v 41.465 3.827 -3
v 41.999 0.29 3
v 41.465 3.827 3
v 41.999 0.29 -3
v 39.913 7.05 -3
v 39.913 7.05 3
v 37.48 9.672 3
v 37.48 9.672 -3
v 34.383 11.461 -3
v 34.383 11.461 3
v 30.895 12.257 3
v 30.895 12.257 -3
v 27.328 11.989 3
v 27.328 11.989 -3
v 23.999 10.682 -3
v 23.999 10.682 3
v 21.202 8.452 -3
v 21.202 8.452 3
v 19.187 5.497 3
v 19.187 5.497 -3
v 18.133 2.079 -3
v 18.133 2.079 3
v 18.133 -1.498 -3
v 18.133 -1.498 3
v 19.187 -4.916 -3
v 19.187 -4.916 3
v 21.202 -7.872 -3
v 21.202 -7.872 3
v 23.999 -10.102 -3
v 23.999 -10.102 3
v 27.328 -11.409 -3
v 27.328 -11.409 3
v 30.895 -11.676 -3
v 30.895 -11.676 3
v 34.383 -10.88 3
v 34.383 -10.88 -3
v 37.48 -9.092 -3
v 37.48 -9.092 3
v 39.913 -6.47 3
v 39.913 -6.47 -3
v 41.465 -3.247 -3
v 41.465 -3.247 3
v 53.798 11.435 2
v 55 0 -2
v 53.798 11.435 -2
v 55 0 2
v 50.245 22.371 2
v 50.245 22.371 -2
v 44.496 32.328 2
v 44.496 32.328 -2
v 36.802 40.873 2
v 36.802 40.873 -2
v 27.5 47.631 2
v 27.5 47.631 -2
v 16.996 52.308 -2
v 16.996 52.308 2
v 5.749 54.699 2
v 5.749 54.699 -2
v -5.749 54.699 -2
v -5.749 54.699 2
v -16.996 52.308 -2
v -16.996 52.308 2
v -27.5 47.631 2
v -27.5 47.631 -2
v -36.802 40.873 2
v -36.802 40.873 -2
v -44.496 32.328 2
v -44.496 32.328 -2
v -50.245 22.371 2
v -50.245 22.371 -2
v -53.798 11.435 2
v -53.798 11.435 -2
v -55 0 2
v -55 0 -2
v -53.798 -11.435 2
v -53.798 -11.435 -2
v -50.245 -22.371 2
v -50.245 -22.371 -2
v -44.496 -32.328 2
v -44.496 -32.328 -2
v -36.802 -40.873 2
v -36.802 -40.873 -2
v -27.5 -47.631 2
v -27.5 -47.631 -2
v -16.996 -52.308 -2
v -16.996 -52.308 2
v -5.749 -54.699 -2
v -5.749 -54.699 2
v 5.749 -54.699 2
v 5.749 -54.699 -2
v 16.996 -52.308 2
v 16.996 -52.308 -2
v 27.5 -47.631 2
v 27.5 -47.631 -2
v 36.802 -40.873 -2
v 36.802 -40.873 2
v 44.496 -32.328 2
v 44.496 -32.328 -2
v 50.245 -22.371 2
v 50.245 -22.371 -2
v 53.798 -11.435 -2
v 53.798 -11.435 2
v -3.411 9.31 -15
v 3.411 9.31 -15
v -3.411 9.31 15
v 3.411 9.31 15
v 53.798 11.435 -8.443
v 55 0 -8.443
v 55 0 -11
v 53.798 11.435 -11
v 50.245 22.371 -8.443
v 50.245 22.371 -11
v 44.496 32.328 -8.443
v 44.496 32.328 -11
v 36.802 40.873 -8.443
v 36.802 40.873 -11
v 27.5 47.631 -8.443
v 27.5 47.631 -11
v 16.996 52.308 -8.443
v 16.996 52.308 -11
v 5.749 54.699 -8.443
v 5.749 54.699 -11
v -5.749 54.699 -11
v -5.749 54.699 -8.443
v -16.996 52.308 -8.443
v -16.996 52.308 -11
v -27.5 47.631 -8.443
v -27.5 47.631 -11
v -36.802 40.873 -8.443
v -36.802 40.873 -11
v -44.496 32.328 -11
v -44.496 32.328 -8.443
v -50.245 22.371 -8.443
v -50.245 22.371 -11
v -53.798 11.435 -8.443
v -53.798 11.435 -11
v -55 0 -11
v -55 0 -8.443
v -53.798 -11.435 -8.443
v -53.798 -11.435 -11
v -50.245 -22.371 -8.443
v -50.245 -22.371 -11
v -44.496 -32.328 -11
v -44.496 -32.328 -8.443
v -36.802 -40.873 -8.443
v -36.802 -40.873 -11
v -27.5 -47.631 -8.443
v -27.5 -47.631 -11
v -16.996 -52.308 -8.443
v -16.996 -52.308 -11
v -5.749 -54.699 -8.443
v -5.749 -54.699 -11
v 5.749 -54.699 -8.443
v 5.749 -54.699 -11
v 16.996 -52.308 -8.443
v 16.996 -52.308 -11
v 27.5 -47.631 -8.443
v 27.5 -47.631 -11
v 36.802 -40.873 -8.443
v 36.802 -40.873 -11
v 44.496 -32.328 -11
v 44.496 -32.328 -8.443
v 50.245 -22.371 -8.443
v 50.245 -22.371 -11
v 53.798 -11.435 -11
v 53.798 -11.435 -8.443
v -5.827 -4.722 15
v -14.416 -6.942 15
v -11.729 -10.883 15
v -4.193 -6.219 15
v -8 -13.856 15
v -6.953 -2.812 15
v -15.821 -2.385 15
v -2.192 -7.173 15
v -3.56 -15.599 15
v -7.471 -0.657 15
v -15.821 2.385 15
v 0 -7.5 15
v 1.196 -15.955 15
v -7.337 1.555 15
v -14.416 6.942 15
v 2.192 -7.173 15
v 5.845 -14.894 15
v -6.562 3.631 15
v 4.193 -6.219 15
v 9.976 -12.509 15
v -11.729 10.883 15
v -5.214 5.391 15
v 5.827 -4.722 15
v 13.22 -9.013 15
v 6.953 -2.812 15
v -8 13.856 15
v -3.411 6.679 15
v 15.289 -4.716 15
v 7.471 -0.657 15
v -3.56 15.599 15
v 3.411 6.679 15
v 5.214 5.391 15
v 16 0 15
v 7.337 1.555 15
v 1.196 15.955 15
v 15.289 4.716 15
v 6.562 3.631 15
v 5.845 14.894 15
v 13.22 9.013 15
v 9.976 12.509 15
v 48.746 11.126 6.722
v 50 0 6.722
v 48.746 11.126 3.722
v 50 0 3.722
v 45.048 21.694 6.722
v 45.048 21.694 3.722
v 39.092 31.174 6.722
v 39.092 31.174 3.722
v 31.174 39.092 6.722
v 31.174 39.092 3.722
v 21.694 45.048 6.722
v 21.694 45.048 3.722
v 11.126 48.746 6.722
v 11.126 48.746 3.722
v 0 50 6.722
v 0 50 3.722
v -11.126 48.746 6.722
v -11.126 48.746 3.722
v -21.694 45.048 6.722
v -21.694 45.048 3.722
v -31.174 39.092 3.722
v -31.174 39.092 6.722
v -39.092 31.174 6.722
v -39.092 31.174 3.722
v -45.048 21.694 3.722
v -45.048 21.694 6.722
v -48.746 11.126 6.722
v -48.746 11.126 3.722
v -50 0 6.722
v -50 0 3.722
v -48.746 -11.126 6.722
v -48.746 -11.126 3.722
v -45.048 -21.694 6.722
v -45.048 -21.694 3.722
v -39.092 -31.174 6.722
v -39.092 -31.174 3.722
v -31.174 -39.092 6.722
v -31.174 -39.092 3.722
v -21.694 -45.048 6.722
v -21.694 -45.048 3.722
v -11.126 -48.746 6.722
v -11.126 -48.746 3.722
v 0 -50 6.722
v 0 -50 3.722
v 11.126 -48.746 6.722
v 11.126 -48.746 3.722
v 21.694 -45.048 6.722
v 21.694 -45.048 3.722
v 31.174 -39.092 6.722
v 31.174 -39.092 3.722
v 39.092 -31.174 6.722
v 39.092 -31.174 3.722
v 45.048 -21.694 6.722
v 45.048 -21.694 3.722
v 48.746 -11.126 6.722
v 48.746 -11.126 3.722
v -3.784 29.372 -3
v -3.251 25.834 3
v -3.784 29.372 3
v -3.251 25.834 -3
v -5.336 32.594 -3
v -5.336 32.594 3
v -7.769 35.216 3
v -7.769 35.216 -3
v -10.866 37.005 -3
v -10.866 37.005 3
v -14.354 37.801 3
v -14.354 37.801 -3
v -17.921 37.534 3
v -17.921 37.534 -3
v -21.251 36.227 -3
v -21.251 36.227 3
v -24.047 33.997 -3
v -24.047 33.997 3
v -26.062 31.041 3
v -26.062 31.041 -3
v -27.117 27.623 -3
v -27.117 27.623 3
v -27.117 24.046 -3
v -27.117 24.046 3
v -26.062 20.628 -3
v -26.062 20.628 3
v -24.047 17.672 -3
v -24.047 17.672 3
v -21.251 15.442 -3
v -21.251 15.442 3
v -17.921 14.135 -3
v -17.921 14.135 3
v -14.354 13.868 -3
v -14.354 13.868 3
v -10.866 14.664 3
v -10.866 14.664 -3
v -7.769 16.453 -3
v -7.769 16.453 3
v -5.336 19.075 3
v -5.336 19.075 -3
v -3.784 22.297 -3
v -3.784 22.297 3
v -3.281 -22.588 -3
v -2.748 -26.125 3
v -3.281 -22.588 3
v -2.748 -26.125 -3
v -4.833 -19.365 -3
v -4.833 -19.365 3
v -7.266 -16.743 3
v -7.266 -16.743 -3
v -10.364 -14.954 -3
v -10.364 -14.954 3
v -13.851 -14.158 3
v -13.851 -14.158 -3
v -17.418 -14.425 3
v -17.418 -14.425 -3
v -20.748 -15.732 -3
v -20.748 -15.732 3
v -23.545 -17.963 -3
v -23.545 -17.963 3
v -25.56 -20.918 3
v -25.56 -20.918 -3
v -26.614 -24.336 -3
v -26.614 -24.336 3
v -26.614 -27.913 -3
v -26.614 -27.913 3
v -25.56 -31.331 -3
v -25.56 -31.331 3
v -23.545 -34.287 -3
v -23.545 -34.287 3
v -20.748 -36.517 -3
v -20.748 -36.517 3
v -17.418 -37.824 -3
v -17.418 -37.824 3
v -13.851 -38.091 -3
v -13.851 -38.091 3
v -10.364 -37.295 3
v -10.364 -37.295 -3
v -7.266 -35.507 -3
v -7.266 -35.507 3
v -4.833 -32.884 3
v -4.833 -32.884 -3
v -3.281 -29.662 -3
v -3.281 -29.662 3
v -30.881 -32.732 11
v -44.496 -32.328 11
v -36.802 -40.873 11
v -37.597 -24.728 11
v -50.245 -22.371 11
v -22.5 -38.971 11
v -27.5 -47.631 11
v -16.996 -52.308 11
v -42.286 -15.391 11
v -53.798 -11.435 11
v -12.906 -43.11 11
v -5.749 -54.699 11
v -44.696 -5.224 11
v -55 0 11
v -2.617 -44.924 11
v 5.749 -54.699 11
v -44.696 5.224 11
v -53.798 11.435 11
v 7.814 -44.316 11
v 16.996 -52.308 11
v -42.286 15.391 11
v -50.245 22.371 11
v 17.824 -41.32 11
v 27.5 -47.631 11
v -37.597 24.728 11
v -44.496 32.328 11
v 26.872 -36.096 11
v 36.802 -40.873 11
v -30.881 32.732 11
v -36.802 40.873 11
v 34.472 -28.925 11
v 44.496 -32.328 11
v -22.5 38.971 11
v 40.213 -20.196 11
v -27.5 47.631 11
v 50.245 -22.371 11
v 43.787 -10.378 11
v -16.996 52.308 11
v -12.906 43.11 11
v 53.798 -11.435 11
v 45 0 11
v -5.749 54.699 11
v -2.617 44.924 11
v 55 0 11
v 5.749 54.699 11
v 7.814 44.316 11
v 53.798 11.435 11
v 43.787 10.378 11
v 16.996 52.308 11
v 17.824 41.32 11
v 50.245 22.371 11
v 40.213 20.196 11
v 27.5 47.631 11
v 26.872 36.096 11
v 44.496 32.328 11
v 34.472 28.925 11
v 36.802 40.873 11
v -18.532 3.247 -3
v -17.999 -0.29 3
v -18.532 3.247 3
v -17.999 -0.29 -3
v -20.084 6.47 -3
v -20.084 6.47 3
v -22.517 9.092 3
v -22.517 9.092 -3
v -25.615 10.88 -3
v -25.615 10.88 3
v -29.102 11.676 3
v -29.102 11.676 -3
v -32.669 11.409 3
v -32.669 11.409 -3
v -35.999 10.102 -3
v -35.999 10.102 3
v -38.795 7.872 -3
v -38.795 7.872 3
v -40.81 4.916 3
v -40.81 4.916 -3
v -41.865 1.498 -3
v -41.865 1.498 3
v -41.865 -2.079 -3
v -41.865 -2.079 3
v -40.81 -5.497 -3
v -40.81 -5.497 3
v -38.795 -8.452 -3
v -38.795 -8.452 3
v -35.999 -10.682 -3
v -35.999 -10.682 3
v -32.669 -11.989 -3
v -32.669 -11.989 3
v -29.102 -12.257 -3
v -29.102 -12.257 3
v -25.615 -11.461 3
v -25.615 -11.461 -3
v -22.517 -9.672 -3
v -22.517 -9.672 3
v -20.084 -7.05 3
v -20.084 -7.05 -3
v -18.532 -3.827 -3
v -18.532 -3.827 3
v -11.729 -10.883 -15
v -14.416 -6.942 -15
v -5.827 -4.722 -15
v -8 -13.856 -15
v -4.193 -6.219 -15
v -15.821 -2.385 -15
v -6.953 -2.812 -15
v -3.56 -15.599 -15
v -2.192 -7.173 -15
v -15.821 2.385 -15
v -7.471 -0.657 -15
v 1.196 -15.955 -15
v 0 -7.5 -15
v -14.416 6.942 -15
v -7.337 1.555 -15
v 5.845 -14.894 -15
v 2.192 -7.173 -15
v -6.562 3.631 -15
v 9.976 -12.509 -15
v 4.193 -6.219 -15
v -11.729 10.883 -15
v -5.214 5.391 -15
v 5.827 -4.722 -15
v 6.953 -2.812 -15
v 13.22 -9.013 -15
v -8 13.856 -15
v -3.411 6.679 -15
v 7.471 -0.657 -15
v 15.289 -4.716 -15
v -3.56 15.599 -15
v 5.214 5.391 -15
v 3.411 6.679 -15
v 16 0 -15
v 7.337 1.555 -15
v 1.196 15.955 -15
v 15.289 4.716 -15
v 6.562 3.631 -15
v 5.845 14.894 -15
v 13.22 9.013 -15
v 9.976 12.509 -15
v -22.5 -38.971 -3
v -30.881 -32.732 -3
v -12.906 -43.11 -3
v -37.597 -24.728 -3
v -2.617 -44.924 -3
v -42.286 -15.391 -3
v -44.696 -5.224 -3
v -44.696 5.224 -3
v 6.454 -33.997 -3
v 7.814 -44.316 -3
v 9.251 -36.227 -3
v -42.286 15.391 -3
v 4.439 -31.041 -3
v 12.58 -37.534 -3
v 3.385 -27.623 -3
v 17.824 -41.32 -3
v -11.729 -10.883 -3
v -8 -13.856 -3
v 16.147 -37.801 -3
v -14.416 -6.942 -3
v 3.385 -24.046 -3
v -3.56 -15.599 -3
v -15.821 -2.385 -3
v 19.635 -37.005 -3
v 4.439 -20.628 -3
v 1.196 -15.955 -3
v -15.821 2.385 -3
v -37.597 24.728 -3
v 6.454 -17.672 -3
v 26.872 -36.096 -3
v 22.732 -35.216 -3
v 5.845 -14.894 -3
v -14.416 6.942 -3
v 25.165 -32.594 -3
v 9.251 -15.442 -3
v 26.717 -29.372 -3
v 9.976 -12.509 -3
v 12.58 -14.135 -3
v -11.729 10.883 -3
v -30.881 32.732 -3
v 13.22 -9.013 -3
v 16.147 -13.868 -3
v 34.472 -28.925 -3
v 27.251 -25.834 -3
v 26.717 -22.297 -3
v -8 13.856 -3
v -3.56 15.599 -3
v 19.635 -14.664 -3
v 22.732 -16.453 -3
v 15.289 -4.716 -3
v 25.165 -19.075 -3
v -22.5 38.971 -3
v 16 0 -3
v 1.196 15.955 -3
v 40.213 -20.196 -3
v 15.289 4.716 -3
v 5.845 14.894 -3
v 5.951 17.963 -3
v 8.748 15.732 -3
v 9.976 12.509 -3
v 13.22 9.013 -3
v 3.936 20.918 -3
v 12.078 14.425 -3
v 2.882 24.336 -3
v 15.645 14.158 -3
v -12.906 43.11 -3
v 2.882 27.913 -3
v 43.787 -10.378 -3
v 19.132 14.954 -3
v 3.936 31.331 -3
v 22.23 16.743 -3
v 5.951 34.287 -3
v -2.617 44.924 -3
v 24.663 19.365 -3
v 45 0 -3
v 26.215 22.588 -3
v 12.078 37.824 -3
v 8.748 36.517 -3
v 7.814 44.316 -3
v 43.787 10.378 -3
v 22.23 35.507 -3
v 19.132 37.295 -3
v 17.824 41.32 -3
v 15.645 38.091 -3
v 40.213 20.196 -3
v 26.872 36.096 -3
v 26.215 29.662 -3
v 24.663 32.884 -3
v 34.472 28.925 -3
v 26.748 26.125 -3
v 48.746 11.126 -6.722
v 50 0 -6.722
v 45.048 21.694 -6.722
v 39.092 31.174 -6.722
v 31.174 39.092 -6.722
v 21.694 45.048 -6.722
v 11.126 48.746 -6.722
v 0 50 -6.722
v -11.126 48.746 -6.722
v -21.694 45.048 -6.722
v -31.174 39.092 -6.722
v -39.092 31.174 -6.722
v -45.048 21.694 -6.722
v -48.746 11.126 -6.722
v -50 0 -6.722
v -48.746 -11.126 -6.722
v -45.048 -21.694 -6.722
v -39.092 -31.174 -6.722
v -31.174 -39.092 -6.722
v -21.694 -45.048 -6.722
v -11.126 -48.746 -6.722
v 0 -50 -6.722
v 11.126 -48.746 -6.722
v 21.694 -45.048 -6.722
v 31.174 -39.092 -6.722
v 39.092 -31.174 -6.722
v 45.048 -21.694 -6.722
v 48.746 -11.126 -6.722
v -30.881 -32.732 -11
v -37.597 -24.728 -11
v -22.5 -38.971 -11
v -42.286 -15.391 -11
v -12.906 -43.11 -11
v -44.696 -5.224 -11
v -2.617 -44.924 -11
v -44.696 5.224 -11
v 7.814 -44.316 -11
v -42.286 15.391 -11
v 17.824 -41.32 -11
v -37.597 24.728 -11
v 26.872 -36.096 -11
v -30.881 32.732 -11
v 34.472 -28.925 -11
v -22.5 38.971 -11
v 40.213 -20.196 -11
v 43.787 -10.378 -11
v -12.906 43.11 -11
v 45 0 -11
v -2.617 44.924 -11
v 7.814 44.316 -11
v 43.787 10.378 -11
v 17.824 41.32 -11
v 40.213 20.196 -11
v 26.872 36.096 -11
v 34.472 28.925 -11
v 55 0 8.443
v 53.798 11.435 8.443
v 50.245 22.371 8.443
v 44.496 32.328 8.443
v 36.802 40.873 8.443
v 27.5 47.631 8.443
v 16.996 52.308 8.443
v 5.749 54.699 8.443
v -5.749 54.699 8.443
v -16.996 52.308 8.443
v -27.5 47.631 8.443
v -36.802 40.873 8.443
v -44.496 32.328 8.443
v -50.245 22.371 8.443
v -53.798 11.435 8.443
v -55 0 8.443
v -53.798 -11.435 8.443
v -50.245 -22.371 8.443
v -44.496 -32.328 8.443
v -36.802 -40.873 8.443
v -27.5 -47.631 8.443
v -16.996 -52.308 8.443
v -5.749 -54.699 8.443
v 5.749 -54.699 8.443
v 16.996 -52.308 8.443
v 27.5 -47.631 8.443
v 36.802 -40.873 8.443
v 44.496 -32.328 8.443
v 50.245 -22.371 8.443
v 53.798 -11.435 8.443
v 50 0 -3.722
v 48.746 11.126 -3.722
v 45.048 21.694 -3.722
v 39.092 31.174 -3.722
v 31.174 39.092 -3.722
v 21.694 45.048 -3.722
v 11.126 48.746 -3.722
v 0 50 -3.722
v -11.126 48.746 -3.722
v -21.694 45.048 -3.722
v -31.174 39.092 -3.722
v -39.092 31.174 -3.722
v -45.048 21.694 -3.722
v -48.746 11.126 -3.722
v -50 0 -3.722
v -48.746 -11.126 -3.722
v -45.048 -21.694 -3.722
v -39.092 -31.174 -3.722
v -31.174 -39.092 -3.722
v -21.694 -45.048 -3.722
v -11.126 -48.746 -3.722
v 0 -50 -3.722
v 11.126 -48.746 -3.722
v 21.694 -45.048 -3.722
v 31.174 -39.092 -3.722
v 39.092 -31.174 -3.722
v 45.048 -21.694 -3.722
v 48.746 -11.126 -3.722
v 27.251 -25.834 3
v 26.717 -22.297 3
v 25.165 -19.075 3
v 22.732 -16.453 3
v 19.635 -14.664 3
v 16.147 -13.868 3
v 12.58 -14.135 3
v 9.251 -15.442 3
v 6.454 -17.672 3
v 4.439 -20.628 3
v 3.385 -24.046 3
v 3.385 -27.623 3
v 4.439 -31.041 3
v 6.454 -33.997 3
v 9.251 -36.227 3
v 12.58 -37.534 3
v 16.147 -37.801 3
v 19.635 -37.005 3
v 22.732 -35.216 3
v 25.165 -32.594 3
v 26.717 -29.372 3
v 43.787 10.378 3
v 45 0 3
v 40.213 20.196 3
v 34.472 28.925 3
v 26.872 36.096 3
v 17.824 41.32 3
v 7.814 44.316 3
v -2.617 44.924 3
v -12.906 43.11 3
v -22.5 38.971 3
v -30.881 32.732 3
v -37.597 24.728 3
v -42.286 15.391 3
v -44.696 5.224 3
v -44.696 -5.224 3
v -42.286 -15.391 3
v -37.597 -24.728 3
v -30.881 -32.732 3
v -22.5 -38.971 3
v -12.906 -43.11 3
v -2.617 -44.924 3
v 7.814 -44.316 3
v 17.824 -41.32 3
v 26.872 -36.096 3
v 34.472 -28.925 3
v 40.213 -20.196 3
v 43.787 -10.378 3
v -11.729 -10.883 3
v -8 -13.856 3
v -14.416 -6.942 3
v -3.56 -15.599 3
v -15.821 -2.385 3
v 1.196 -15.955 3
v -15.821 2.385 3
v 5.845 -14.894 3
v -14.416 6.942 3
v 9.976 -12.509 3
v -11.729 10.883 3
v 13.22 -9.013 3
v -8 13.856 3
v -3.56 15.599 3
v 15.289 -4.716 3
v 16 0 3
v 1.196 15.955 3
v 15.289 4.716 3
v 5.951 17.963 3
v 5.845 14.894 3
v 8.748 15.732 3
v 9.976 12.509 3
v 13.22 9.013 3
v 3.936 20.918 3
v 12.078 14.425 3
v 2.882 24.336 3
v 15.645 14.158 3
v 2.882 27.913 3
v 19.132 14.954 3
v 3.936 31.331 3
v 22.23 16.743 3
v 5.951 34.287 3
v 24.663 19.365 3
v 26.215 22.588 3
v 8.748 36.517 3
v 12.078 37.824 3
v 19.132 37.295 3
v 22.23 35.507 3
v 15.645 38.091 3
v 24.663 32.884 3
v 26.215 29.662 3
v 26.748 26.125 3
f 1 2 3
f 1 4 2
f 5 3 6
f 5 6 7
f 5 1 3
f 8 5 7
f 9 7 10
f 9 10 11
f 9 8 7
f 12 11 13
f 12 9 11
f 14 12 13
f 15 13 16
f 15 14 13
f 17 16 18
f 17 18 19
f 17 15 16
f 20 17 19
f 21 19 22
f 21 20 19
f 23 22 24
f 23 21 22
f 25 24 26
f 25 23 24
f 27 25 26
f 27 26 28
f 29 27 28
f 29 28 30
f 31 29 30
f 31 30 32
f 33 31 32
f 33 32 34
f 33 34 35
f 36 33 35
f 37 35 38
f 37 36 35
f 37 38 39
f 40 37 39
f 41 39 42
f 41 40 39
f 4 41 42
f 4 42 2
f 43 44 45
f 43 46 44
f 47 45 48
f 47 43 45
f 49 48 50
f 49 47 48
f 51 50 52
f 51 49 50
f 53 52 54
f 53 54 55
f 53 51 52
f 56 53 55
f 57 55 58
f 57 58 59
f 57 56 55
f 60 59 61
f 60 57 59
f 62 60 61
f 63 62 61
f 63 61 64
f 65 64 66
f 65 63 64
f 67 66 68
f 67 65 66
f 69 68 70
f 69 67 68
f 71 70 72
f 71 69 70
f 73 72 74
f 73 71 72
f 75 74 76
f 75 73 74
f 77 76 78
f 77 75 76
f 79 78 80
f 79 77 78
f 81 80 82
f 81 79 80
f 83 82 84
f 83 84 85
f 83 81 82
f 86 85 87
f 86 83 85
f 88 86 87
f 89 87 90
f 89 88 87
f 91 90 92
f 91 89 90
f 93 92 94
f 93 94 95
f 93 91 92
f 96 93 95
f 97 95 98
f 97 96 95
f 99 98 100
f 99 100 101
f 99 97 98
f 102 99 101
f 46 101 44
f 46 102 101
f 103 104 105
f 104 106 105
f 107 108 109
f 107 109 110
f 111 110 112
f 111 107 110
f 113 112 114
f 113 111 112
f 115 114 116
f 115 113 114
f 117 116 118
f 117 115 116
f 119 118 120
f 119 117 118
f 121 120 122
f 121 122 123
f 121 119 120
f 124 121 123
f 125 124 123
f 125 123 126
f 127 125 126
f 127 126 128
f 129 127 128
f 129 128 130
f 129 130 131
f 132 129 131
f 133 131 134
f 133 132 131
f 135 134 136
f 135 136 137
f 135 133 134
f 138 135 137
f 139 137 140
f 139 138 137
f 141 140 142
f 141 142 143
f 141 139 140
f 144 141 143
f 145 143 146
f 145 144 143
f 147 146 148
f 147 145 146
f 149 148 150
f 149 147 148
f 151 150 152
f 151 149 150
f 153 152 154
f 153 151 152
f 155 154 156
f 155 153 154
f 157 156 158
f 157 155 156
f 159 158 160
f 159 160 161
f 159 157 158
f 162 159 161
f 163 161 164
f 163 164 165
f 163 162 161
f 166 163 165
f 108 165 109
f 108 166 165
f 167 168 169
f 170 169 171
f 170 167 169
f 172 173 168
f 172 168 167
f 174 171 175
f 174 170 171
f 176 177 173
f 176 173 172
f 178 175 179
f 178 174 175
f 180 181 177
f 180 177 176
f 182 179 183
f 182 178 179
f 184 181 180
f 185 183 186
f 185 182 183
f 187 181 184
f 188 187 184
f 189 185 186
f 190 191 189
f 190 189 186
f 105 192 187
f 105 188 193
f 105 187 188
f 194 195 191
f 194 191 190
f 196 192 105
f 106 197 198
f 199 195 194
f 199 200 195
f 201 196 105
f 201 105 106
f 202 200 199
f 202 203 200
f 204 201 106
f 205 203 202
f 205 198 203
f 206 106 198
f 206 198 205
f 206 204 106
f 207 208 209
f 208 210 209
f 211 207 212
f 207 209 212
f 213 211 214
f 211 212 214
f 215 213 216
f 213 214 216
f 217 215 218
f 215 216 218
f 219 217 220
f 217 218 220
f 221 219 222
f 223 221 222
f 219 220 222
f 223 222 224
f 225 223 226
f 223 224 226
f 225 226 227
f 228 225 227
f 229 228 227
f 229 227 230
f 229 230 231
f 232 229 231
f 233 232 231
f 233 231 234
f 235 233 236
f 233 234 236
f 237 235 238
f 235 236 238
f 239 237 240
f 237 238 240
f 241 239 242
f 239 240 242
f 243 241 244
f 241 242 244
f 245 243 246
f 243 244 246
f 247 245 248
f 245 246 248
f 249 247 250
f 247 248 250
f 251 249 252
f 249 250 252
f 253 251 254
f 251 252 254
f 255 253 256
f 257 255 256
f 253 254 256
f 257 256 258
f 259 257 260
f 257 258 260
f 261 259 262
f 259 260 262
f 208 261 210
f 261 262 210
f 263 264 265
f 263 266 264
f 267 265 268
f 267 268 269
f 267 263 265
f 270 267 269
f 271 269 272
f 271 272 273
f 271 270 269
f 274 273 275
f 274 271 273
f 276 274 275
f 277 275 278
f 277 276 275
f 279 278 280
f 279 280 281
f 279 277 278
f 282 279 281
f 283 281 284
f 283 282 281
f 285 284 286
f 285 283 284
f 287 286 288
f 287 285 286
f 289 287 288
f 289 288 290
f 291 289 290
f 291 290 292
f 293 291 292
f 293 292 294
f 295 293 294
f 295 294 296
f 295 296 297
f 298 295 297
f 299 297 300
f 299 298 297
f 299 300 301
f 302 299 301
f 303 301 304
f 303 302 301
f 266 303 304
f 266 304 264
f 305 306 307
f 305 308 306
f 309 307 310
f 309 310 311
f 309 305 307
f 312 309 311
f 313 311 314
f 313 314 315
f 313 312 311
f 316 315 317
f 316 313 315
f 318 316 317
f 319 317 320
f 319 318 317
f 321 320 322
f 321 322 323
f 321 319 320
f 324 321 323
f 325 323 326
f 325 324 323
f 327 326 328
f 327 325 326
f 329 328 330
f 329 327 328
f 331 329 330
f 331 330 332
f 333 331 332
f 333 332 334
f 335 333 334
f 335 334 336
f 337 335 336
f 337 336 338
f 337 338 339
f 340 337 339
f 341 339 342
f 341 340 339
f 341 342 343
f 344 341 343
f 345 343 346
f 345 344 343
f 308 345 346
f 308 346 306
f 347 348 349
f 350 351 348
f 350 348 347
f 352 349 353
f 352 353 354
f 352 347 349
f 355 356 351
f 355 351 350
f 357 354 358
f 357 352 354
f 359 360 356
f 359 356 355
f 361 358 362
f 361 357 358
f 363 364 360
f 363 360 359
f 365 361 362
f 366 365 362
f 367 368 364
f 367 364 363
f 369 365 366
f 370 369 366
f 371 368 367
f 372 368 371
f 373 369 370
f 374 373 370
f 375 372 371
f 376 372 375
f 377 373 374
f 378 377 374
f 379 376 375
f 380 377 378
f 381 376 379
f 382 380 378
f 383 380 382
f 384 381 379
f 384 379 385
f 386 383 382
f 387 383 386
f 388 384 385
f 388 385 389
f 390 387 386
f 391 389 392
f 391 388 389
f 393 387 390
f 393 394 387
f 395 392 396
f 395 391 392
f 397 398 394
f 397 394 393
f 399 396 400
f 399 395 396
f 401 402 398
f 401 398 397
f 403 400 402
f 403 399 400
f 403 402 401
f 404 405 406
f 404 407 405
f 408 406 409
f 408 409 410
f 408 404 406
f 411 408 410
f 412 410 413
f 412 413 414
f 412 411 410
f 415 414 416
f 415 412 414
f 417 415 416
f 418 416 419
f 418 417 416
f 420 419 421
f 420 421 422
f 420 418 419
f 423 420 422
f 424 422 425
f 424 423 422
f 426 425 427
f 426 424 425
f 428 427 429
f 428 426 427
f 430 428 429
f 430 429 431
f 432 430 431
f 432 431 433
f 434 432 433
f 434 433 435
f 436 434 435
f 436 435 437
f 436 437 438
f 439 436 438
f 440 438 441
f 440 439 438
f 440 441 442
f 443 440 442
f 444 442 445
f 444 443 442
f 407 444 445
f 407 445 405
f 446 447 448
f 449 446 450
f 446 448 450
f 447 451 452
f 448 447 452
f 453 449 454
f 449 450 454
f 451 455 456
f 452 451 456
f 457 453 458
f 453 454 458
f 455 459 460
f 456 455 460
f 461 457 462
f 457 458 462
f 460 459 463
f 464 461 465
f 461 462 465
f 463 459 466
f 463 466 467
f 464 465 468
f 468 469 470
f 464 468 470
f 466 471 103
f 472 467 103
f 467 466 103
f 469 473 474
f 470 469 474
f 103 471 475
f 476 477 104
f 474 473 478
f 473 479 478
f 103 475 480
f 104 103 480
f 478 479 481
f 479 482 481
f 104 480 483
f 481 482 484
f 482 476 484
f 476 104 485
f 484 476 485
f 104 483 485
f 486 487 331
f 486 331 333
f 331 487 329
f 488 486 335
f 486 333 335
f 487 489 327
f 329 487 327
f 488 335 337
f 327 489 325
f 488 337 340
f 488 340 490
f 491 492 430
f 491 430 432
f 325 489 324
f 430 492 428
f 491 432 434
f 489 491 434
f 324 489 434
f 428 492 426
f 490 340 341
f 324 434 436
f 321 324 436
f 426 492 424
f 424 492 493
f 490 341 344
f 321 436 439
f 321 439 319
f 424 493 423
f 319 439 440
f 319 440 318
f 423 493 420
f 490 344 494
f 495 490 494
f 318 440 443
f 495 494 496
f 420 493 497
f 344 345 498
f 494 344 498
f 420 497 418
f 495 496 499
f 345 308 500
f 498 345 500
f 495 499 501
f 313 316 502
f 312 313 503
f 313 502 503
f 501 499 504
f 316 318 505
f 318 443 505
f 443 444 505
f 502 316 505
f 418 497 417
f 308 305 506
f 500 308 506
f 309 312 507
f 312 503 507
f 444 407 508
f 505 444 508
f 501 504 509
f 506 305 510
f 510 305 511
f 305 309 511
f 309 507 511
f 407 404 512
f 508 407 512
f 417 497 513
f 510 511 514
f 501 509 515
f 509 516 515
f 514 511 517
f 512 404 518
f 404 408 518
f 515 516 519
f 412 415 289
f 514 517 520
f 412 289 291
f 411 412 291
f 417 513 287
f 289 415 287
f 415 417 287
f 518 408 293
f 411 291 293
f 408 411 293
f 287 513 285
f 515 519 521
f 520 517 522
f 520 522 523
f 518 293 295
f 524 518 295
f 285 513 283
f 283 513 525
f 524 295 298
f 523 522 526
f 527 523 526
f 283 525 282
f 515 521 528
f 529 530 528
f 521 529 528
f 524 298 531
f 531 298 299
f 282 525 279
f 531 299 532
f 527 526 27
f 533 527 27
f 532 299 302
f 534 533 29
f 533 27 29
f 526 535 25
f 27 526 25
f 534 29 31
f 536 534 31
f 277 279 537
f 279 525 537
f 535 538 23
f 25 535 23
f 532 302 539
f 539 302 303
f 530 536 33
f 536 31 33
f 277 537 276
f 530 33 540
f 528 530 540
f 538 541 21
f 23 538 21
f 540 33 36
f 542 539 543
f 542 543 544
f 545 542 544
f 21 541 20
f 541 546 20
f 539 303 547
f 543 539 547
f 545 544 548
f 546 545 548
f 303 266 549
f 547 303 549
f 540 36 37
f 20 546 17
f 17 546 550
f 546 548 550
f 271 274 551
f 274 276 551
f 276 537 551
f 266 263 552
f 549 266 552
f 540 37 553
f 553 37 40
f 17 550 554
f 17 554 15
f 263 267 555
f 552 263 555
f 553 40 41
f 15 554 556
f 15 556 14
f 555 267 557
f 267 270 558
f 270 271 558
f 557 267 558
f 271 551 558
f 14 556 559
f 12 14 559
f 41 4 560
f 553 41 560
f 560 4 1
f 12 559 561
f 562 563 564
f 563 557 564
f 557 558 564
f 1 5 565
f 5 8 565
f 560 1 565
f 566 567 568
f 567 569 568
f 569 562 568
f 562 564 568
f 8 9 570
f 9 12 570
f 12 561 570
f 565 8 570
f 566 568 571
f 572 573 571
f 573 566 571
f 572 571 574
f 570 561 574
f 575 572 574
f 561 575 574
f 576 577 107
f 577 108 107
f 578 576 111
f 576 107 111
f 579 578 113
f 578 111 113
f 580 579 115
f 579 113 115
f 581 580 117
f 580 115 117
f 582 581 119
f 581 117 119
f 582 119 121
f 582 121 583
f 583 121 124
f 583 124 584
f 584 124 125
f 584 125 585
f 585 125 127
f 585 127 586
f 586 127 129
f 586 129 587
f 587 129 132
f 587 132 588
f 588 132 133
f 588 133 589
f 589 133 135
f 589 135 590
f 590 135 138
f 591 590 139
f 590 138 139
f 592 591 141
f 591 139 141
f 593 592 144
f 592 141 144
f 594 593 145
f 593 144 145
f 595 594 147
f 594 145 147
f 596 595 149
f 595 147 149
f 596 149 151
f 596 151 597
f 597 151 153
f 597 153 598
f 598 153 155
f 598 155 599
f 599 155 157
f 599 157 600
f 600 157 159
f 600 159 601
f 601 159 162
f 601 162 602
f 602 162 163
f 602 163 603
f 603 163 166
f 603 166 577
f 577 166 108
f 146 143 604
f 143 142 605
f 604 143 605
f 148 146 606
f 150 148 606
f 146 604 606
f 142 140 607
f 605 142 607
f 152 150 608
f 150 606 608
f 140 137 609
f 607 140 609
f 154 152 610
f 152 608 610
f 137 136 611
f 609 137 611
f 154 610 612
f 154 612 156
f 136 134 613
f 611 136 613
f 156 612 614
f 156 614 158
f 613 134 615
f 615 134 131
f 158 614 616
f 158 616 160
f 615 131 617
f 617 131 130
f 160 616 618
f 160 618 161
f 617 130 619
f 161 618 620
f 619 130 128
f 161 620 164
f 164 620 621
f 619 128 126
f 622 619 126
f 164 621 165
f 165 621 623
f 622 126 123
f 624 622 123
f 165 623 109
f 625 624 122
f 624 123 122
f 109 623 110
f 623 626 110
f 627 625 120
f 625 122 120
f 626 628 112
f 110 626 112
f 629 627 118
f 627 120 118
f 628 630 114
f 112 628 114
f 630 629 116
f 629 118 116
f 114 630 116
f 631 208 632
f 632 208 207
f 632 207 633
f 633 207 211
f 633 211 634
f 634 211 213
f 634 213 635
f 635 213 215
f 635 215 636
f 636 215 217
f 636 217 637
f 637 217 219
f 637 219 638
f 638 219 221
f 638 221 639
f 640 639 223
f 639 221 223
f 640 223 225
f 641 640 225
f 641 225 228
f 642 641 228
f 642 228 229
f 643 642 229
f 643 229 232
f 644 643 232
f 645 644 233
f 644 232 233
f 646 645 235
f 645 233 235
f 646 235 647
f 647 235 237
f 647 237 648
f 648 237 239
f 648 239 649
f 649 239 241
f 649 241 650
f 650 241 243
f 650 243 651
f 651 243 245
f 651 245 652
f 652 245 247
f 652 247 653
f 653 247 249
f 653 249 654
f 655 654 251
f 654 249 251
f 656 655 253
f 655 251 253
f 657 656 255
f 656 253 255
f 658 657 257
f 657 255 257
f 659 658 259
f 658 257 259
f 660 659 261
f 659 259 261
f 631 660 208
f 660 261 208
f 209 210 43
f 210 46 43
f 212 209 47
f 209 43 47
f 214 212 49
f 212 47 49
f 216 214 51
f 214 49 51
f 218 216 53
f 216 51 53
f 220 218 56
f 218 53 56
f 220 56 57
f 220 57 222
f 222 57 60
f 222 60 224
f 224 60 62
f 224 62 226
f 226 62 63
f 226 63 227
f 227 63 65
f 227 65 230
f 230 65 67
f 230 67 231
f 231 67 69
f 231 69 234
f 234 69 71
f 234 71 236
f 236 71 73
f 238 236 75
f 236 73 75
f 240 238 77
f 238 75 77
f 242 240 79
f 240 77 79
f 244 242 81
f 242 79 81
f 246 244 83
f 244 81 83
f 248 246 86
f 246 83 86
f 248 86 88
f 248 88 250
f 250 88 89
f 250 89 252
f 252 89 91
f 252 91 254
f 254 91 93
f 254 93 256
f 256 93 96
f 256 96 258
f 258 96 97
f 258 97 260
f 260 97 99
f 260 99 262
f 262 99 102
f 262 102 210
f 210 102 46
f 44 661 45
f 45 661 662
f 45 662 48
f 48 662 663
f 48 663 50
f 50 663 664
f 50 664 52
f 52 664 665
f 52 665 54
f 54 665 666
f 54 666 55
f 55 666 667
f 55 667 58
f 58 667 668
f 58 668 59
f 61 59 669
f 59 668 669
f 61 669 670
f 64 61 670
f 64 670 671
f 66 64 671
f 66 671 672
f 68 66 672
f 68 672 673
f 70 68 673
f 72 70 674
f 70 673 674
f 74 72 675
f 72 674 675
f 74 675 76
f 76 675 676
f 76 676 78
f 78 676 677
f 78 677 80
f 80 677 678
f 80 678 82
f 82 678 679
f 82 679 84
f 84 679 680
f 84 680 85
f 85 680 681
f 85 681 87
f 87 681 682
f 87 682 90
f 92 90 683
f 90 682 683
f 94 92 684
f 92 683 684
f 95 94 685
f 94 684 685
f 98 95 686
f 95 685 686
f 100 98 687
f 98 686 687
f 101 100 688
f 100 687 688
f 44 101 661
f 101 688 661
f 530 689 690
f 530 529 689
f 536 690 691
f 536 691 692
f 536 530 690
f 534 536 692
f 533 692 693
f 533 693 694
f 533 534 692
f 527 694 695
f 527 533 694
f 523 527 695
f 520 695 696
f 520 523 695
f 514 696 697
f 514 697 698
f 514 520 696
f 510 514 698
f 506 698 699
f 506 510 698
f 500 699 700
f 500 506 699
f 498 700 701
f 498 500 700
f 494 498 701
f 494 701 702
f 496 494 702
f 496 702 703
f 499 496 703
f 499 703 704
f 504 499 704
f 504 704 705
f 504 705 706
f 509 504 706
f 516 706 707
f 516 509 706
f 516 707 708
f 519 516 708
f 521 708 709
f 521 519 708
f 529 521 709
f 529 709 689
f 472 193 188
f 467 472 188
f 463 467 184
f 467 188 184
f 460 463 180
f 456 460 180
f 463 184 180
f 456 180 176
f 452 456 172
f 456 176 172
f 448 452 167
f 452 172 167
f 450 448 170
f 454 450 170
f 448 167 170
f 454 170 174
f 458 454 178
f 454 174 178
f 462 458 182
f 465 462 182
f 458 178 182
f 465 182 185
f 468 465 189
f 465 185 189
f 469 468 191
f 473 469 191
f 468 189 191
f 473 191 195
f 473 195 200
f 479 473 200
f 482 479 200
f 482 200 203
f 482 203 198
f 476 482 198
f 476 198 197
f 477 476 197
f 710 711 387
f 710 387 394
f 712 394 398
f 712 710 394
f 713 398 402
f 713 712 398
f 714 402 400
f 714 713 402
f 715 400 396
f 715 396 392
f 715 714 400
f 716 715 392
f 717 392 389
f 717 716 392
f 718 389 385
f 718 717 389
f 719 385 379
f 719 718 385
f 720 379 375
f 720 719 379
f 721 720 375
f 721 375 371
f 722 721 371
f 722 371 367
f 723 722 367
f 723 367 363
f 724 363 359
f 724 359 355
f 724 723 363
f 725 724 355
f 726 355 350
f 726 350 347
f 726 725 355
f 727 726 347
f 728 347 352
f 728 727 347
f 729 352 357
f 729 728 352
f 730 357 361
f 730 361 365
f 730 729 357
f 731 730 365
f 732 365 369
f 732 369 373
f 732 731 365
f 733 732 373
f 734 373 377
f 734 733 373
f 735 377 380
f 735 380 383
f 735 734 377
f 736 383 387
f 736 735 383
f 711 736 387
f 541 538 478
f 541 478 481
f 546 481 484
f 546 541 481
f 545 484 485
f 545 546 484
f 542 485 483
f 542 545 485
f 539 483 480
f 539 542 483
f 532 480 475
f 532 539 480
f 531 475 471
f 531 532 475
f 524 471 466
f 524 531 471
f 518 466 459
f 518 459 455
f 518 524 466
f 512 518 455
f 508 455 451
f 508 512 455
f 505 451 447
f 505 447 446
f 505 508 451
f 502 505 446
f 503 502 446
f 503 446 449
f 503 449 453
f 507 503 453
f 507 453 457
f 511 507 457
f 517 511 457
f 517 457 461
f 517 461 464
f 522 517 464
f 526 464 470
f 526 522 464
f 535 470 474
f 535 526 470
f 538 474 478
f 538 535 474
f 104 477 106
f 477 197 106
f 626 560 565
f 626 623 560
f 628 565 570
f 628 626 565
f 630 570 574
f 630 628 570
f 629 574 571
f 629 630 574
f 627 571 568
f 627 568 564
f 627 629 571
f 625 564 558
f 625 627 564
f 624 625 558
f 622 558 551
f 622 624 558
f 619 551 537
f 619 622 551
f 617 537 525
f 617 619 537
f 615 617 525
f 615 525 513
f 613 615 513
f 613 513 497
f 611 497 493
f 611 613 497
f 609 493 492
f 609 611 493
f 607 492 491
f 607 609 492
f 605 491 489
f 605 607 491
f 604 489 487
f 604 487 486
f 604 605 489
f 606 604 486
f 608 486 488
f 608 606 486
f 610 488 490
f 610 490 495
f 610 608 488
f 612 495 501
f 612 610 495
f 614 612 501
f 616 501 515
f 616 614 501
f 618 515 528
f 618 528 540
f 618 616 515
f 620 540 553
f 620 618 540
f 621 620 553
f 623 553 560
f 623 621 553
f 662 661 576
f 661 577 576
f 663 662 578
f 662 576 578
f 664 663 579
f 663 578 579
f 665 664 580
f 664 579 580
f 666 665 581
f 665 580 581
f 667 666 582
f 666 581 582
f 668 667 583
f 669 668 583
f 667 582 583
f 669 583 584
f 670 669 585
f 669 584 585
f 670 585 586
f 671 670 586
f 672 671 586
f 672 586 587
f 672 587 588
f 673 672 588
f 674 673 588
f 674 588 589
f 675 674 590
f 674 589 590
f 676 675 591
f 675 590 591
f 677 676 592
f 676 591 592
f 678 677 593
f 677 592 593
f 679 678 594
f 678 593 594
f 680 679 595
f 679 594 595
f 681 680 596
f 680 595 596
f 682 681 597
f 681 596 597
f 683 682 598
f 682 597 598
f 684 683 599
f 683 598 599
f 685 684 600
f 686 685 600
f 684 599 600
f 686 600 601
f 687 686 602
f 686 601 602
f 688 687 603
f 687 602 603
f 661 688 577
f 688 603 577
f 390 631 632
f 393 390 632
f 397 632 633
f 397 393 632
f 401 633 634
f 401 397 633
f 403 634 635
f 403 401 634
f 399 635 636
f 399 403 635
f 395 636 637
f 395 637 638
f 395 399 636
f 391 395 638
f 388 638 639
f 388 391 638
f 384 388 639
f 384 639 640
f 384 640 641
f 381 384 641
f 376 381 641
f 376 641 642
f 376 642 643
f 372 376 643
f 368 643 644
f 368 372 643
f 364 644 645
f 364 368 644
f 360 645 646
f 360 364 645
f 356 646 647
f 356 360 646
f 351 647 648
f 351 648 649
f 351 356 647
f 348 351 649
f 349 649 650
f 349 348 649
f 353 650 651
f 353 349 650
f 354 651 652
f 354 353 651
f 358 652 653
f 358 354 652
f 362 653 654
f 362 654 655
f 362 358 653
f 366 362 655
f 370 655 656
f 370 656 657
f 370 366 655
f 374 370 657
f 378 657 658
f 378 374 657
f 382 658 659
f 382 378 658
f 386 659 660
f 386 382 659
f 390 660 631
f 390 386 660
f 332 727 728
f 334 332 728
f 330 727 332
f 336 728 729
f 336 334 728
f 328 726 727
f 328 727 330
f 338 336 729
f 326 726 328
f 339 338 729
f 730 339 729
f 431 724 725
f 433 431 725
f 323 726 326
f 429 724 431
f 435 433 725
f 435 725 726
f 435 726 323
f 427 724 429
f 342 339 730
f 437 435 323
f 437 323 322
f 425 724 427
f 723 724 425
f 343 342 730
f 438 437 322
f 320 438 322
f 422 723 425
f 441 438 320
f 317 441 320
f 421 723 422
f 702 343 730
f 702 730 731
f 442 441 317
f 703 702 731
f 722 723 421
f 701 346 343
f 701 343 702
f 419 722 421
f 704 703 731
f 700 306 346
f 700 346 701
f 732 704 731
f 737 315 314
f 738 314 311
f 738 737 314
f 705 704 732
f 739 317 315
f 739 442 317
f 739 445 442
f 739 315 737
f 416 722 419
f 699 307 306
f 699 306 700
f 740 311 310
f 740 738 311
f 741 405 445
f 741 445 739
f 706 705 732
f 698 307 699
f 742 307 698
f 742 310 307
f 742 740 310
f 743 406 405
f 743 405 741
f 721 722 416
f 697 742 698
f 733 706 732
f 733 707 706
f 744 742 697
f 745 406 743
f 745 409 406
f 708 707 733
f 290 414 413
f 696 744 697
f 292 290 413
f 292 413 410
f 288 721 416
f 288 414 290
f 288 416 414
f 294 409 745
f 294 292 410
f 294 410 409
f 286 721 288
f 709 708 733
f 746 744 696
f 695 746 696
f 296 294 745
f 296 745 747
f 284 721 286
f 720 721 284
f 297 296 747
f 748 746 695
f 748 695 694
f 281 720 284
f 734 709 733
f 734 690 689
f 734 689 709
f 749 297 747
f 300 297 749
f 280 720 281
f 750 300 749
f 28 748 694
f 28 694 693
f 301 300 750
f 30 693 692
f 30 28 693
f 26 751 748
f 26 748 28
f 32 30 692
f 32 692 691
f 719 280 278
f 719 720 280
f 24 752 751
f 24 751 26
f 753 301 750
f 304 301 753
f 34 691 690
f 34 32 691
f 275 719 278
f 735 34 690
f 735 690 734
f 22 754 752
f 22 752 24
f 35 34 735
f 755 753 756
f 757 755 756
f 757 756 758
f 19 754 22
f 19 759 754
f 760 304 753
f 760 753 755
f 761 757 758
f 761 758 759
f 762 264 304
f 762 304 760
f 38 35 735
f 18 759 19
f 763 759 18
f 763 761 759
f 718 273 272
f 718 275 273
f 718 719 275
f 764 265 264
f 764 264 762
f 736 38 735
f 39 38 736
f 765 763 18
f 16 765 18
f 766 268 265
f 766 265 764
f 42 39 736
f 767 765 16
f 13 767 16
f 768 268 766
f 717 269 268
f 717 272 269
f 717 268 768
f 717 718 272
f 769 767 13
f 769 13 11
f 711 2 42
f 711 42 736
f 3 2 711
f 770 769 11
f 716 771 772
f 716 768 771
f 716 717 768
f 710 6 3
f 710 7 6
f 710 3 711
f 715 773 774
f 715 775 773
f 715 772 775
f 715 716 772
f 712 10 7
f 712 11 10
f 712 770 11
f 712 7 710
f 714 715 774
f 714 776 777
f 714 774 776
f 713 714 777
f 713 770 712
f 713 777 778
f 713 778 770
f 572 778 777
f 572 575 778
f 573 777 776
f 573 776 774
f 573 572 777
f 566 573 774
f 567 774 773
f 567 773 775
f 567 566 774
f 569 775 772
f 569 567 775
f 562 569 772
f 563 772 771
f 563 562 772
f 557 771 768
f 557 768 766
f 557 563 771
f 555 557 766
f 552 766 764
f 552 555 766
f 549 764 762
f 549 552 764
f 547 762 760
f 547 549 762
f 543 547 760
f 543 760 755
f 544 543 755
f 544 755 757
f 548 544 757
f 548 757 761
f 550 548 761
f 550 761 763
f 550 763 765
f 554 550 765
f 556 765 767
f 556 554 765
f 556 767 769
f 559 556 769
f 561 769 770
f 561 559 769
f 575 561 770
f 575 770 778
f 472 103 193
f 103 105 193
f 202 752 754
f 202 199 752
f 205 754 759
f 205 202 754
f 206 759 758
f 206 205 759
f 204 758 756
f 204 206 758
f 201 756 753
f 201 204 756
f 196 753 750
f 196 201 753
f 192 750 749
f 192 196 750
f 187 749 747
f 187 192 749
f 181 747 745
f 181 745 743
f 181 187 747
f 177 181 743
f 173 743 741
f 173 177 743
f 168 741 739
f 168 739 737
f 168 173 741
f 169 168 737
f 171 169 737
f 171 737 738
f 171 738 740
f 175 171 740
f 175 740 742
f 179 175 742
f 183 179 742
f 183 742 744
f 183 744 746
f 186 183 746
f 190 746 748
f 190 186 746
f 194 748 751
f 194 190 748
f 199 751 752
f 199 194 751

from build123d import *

# Parameters (mm, degrees)
SKETCH_2_R      = 16
EXTRUDE_5_DEPTH = 15
SKETCH_2_11_R   = 55
SKETCH_2_11_R_2 = 45
EXTRUDE_6_DEPTH = 11
SKETCH_2_20_R   = 45
SKETCH_2_20_R_2 = 12
SKETCH_2_20_R_3 = 16
EXTRUDE_9_DEPTH = 3


# Read off the part's stored shape, not the designer's step: 切除-旋转-薄壁6
with BuildPart() as part:
    # 草图2 → 凸台-拉伸5 (new, symmetric)
    with BuildSketch(Plane.XY):
        Circle(SKETCH_2_R)
        with BuildLine():
            ThreePointArc((-3.410963595, 6.679470589), (0, -7.5), (3.410963595, 6.679470589))
            Line((3.410963595, 6.679470589), (3.410963595, 9.309886023))
            Line((3.410963595, 9.309886023), (-3.410963595, 9.309886023))
            Line((-3.410963595, 9.309886023), (-3.410963595, 6.679470589))
        make_face(mode=Mode.SUBTRACT)
    extrude(amount=EXTRUDE_5_DEPTH, both=True)



with BuildPart() as body_2:
    # 草图2<11> → 凸台-拉伸6 (new, symmetric)
    with BuildSketch(Plane.XY):
        Circle(SKETCH_2_11_R)
        Circle(SKETCH_2_11_R_2, mode=Mode.SUBTRACT)
    extrude(amount=EXTRUDE_6_DEPTH, both=True)

    # 切除-旋转-薄壁6 outline → 切除-旋转-薄壁6 (revolve, cut)
    with BuildSketch(Plane.XZ):
        Polygon((55, -2), (50, -3.721638066), (50, -6.721638066), (55, -8.443276133), align=None)
        Polygon((50, 3.721638066), (55, 2), (55, 8.443276133), (50, 6.721638066), align=None)
    revolve(axis=Axis((0, 0, 0), (0, 0, 1)), mode=Mode.SUBTRACT)


with BuildPart() as part_1:
    add(part.part)

    add(body_2.part)  # 凸台-拉伸9 merges body 2
    # 草图2<20> → 凸台-拉伸9 (add, symmetric)
    with BuildSketch(Plane.XY):
        Circle(SKETCH_2_20_R)
        with Locations((-29.998597199, -0.290113977)):
            Circle(SKETCH_2_20_R_2, mode=Mode.SUBTRACT)
        with Locations((-15.250544673, 25.834490264)):
            Circle(SKETCH_2_20_R_2, mode=Mode.SUBTRACT)
        with Locations((14.748052526, 26.12460424)):
            Circle(SKETCH_2_20_R_2, mode=Mode.SUBTRACT)
        with Locations((29.998597199, 0.290113977)):
            Circle(SKETCH_2_20_R_2, mode=Mode.SUBTRACT)
        with Locations((15.250544673, -25.834490264)):
            Circle(SKETCH_2_20_R_2, mode=Mode.SUBTRACT)
        with Locations((-14.748052526, -26.12460424)):
            Circle(SKETCH_2_20_R_2, mode=Mode.SUBTRACT)
        Circle(SKETCH_2_20_R_3, mode=Mode.SUBTRACT)
    extrude(amount=EXTRUDE_9_DEPTH, both=True)


solid = part_1.part
